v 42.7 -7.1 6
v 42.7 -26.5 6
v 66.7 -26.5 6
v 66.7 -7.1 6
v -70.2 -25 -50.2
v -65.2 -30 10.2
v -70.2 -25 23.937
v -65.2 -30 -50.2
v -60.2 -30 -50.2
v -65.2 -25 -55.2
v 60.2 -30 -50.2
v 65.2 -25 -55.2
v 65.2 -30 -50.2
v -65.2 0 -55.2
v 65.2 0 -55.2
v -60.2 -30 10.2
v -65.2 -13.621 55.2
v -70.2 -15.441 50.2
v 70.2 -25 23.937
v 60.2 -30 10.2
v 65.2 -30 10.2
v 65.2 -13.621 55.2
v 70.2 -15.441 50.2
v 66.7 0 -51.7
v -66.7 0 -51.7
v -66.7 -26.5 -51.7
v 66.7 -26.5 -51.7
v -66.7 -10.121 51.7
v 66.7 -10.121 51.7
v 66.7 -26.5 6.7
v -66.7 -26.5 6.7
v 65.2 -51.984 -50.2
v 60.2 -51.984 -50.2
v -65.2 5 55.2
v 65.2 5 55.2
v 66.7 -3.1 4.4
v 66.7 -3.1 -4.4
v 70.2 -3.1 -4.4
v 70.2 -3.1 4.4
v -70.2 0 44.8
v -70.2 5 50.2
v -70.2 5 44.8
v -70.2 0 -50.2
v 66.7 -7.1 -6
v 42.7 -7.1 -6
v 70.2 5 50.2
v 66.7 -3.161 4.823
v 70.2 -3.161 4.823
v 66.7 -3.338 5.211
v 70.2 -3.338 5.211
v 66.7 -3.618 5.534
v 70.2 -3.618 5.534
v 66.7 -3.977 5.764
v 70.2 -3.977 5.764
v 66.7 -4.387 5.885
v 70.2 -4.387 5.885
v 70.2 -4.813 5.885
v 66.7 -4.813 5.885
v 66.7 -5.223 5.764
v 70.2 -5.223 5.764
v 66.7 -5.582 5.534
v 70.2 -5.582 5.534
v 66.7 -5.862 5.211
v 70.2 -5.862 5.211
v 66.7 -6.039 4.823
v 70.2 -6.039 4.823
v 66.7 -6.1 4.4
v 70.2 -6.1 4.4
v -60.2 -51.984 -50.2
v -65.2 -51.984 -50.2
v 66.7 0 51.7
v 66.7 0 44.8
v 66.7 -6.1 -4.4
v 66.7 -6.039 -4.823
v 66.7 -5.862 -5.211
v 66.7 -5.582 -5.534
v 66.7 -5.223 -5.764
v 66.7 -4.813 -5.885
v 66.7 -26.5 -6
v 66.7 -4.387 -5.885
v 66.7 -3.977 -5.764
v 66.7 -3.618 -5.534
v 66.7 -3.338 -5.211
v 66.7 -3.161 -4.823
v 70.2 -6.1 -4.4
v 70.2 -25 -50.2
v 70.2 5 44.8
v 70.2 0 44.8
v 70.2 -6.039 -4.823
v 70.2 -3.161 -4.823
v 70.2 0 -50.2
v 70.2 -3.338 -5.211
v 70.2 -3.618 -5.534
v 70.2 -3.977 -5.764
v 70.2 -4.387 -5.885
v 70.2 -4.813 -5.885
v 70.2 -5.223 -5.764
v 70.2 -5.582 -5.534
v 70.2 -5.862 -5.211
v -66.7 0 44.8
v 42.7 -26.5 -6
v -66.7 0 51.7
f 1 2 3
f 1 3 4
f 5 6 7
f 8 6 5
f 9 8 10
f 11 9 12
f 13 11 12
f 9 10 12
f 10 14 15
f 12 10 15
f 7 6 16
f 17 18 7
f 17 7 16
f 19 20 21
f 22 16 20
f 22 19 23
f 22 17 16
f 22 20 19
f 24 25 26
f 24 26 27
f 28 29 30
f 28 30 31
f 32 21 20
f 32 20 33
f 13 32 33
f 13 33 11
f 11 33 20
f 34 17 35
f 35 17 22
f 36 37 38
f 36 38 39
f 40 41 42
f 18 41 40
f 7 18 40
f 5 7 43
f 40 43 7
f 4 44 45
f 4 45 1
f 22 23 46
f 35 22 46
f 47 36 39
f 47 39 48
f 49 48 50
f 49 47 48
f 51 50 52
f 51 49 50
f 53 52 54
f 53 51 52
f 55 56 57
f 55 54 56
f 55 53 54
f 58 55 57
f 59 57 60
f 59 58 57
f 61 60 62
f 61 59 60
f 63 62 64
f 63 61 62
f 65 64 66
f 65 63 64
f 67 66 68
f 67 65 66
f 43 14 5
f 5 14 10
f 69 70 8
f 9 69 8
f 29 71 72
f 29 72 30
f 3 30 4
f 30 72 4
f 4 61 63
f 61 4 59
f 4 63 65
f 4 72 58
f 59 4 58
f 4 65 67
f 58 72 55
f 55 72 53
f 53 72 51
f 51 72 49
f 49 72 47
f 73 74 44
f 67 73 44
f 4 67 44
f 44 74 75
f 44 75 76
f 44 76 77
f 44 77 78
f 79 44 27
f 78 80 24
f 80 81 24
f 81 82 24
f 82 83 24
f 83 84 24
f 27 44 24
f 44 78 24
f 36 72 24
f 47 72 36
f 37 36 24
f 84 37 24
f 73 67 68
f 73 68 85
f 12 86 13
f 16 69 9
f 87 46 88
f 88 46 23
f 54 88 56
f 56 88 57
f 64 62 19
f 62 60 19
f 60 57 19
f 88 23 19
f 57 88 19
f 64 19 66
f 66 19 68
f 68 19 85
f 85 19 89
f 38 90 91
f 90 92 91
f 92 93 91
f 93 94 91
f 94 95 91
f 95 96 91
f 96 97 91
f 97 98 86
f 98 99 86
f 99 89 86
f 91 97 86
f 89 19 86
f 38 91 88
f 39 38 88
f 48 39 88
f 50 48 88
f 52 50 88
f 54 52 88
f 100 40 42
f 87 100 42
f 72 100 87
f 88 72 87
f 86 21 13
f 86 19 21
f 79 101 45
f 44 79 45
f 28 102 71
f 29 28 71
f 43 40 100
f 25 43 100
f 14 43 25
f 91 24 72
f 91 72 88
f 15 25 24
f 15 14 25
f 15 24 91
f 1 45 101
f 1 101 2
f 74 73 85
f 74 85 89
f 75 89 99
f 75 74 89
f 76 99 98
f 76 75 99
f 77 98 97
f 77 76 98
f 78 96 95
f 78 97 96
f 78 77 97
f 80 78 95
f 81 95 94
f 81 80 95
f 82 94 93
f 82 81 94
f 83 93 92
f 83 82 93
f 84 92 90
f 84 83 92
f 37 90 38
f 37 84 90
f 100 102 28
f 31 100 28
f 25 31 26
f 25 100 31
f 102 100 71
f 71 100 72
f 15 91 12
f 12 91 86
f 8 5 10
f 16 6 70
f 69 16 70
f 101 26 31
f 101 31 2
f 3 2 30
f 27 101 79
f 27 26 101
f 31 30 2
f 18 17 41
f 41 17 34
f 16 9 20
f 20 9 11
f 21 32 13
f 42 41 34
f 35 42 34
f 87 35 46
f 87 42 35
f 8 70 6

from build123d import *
from OCP.BRepFilletAPI import BRepFilletAPI_MakeChamfer

# Parameters (mm, degrees)
SKETCH1_W           = 140.4
SKETCH1_H           = 110.4
BOSS_EXTRUDE1_DEPTH = 30
SHELL1_T            = -3.5
SKETCH2_W           = 140.4
SKETCH2_H           = 10.4
BOSS_EXTRUDE2_DEPTH = 5
CUT_EXTRUDE3_DEPTH  = 5
SKETCH5_W           = 12
SKETCH5_H           = 19.4
BOSS_EXTRUDE3_DEPTH = 24
CHAMFER1_SIZE       = 45
CHAMFER1_SIZE2      = 16.378660542
CHAMFER3_SIZE       = 5
BOSS_EXTRUDE5_DEPTH = 5


with BuildPart() as part:
    # Sketch1 → Boss-Extrude1 (new body)
    with BuildSketch(Plane(origin=(0, 0, 0), x_dir=(1, 0, 0), z_dir=(0, 1, 0))):
        Rectangle(SKETCH1_W, SKETCH1_H)
    extrude(amount=-BOSS_EXTRUDE1_DEPTH)

    # Shell1
    shell1_openings = [part.faces().sort_by_distance(p)[0] for p in [
        (0, 0, 0),
    ]]
    offset(amount=SHELL1_T, openings=shell1_openings, kind=Kind.INTERSECTION)

    # Sketch2 → Boss-Extrude2 (add)
    with BuildSketch(Plane(origin=(0, 0, 0), x_dir=(1, 0, 0), z_dir=(0, 1, 0))):
        with Locations((0, -50)):
            Rectangle(SKETCH2_W, SKETCH2_H)
    extrude(amount=BOSS_EXTRUDE2_DEPTH)

    # Sketch6 → Cut-Extrude3 (cut)
    with BuildSketch(Plane.ZY.offset(-66.7)):
        with BuildLine():
            Line((-4.4, -3.1), (4.4, -3.1))
            ThreePointArc((4.4, -3.1), (5.9, -4.6), (4.4, -6.1))
            Line((4.4, -6.1), (-4.4, -6.1))
            ThreePointArc((-4.4, -6.1), (-5.9, -4.6), (-4.4, -3.1))
        make_face()
    extrude(amount=-CUT_EXTRUDE3_DEPTH, mode=Mode.SUBTRACT)

    # Sketch5 → Boss-Extrude3 (add)
    with BuildSketch(Plane.ZY.offset(-66.7)):
        with Locations((0, -16.8)):
            Rectangle(SKETCH5_W, SKETCH5_H)
    extrude(amount=BOSS_EXTRUDE3_DEPTH)

    # Chamfer1: one chamfer whose edges measure the first distance from different faces: ONE call of the kernel's chamfer builder (chamfer() names one face for all edges)
    chamfer1_edges_1 = [part.edges().sort_by_distance(p)[0] for p in [
        (0, -26.5, 51.7),
    ]]
    chamfer1_side_1 = [part.faces().sort_by_distance(p)[0] for p in [
        (-1.166452928, -26.5, 0),
    ]]
    chamfer1_edges_2 = [part.edges().sort_by_distance(p)[0] for p in [
        (0, -30, 55.2),
    ]]
    chamfer1_side_2 = [part.faces().sort_by_distance(p)[0] for p in [
        (0, -30, 0),
    ]]
    chamfer1 = BRepFilletAPI_MakeChamfer(part.part.solid().wrapped)
    for e in chamfer1_edges_1:
        chamfer1.Add(CHAMFER1_SIZE, CHAMFER1_SIZE2, e.wrapped, chamfer1_side_1[0].wrapped)  # the first distance lies on this face
    for e in chamfer1_edges_2:
        chamfer1.Add(CHAMFER1_SIZE, CHAMFER1_SIZE2, e.wrapped, chamfer1_side_2[0].wrapped)  # the first distance lies on this face
    add(Compound.cast(chamfer1.Shape()), mode=Mode.REPLACE)

    # Chamfer3
    chamfer3_edges = [part.edges().sort_by_distance(p)[0] for p in [
        (-70.2, -30, -22.5),
        (-70.2, -15, -55.2),
        (70.2, -15, -55.2),
        (70.2, -4.310669729, 55.2),
        (-70.2, -4.310669729, 55.2),
        (70.2, -30, -22.5),
        (0, -30, -55.2),
    ]]
    chamfer(chamfer3_edges, length=CHAMFER3_SIZE)

    # Sketch10 → Boss-Extrude5 (add)
    with BuildSketch(Plane(origin=(65.2, 0, 0), x_dir=(0, 0, 1), z_dir=(1, 0, 0))):
        Polygon((-50.2, 30), (10.2, 30), (-50.2, 51.98380215), align=None)
    boss_extrude5 = extrude(amount=-BOSS_EXTRUDE5_DEPTH)

    # Mirror1: Boss-Extrude5 across plane
    add(boss_extrude5.mirror(Plane(origin=(0, 0, 0), x_dir=(0, 0, 1), z_dir=(1, 0, 0))))


solid = part.part
